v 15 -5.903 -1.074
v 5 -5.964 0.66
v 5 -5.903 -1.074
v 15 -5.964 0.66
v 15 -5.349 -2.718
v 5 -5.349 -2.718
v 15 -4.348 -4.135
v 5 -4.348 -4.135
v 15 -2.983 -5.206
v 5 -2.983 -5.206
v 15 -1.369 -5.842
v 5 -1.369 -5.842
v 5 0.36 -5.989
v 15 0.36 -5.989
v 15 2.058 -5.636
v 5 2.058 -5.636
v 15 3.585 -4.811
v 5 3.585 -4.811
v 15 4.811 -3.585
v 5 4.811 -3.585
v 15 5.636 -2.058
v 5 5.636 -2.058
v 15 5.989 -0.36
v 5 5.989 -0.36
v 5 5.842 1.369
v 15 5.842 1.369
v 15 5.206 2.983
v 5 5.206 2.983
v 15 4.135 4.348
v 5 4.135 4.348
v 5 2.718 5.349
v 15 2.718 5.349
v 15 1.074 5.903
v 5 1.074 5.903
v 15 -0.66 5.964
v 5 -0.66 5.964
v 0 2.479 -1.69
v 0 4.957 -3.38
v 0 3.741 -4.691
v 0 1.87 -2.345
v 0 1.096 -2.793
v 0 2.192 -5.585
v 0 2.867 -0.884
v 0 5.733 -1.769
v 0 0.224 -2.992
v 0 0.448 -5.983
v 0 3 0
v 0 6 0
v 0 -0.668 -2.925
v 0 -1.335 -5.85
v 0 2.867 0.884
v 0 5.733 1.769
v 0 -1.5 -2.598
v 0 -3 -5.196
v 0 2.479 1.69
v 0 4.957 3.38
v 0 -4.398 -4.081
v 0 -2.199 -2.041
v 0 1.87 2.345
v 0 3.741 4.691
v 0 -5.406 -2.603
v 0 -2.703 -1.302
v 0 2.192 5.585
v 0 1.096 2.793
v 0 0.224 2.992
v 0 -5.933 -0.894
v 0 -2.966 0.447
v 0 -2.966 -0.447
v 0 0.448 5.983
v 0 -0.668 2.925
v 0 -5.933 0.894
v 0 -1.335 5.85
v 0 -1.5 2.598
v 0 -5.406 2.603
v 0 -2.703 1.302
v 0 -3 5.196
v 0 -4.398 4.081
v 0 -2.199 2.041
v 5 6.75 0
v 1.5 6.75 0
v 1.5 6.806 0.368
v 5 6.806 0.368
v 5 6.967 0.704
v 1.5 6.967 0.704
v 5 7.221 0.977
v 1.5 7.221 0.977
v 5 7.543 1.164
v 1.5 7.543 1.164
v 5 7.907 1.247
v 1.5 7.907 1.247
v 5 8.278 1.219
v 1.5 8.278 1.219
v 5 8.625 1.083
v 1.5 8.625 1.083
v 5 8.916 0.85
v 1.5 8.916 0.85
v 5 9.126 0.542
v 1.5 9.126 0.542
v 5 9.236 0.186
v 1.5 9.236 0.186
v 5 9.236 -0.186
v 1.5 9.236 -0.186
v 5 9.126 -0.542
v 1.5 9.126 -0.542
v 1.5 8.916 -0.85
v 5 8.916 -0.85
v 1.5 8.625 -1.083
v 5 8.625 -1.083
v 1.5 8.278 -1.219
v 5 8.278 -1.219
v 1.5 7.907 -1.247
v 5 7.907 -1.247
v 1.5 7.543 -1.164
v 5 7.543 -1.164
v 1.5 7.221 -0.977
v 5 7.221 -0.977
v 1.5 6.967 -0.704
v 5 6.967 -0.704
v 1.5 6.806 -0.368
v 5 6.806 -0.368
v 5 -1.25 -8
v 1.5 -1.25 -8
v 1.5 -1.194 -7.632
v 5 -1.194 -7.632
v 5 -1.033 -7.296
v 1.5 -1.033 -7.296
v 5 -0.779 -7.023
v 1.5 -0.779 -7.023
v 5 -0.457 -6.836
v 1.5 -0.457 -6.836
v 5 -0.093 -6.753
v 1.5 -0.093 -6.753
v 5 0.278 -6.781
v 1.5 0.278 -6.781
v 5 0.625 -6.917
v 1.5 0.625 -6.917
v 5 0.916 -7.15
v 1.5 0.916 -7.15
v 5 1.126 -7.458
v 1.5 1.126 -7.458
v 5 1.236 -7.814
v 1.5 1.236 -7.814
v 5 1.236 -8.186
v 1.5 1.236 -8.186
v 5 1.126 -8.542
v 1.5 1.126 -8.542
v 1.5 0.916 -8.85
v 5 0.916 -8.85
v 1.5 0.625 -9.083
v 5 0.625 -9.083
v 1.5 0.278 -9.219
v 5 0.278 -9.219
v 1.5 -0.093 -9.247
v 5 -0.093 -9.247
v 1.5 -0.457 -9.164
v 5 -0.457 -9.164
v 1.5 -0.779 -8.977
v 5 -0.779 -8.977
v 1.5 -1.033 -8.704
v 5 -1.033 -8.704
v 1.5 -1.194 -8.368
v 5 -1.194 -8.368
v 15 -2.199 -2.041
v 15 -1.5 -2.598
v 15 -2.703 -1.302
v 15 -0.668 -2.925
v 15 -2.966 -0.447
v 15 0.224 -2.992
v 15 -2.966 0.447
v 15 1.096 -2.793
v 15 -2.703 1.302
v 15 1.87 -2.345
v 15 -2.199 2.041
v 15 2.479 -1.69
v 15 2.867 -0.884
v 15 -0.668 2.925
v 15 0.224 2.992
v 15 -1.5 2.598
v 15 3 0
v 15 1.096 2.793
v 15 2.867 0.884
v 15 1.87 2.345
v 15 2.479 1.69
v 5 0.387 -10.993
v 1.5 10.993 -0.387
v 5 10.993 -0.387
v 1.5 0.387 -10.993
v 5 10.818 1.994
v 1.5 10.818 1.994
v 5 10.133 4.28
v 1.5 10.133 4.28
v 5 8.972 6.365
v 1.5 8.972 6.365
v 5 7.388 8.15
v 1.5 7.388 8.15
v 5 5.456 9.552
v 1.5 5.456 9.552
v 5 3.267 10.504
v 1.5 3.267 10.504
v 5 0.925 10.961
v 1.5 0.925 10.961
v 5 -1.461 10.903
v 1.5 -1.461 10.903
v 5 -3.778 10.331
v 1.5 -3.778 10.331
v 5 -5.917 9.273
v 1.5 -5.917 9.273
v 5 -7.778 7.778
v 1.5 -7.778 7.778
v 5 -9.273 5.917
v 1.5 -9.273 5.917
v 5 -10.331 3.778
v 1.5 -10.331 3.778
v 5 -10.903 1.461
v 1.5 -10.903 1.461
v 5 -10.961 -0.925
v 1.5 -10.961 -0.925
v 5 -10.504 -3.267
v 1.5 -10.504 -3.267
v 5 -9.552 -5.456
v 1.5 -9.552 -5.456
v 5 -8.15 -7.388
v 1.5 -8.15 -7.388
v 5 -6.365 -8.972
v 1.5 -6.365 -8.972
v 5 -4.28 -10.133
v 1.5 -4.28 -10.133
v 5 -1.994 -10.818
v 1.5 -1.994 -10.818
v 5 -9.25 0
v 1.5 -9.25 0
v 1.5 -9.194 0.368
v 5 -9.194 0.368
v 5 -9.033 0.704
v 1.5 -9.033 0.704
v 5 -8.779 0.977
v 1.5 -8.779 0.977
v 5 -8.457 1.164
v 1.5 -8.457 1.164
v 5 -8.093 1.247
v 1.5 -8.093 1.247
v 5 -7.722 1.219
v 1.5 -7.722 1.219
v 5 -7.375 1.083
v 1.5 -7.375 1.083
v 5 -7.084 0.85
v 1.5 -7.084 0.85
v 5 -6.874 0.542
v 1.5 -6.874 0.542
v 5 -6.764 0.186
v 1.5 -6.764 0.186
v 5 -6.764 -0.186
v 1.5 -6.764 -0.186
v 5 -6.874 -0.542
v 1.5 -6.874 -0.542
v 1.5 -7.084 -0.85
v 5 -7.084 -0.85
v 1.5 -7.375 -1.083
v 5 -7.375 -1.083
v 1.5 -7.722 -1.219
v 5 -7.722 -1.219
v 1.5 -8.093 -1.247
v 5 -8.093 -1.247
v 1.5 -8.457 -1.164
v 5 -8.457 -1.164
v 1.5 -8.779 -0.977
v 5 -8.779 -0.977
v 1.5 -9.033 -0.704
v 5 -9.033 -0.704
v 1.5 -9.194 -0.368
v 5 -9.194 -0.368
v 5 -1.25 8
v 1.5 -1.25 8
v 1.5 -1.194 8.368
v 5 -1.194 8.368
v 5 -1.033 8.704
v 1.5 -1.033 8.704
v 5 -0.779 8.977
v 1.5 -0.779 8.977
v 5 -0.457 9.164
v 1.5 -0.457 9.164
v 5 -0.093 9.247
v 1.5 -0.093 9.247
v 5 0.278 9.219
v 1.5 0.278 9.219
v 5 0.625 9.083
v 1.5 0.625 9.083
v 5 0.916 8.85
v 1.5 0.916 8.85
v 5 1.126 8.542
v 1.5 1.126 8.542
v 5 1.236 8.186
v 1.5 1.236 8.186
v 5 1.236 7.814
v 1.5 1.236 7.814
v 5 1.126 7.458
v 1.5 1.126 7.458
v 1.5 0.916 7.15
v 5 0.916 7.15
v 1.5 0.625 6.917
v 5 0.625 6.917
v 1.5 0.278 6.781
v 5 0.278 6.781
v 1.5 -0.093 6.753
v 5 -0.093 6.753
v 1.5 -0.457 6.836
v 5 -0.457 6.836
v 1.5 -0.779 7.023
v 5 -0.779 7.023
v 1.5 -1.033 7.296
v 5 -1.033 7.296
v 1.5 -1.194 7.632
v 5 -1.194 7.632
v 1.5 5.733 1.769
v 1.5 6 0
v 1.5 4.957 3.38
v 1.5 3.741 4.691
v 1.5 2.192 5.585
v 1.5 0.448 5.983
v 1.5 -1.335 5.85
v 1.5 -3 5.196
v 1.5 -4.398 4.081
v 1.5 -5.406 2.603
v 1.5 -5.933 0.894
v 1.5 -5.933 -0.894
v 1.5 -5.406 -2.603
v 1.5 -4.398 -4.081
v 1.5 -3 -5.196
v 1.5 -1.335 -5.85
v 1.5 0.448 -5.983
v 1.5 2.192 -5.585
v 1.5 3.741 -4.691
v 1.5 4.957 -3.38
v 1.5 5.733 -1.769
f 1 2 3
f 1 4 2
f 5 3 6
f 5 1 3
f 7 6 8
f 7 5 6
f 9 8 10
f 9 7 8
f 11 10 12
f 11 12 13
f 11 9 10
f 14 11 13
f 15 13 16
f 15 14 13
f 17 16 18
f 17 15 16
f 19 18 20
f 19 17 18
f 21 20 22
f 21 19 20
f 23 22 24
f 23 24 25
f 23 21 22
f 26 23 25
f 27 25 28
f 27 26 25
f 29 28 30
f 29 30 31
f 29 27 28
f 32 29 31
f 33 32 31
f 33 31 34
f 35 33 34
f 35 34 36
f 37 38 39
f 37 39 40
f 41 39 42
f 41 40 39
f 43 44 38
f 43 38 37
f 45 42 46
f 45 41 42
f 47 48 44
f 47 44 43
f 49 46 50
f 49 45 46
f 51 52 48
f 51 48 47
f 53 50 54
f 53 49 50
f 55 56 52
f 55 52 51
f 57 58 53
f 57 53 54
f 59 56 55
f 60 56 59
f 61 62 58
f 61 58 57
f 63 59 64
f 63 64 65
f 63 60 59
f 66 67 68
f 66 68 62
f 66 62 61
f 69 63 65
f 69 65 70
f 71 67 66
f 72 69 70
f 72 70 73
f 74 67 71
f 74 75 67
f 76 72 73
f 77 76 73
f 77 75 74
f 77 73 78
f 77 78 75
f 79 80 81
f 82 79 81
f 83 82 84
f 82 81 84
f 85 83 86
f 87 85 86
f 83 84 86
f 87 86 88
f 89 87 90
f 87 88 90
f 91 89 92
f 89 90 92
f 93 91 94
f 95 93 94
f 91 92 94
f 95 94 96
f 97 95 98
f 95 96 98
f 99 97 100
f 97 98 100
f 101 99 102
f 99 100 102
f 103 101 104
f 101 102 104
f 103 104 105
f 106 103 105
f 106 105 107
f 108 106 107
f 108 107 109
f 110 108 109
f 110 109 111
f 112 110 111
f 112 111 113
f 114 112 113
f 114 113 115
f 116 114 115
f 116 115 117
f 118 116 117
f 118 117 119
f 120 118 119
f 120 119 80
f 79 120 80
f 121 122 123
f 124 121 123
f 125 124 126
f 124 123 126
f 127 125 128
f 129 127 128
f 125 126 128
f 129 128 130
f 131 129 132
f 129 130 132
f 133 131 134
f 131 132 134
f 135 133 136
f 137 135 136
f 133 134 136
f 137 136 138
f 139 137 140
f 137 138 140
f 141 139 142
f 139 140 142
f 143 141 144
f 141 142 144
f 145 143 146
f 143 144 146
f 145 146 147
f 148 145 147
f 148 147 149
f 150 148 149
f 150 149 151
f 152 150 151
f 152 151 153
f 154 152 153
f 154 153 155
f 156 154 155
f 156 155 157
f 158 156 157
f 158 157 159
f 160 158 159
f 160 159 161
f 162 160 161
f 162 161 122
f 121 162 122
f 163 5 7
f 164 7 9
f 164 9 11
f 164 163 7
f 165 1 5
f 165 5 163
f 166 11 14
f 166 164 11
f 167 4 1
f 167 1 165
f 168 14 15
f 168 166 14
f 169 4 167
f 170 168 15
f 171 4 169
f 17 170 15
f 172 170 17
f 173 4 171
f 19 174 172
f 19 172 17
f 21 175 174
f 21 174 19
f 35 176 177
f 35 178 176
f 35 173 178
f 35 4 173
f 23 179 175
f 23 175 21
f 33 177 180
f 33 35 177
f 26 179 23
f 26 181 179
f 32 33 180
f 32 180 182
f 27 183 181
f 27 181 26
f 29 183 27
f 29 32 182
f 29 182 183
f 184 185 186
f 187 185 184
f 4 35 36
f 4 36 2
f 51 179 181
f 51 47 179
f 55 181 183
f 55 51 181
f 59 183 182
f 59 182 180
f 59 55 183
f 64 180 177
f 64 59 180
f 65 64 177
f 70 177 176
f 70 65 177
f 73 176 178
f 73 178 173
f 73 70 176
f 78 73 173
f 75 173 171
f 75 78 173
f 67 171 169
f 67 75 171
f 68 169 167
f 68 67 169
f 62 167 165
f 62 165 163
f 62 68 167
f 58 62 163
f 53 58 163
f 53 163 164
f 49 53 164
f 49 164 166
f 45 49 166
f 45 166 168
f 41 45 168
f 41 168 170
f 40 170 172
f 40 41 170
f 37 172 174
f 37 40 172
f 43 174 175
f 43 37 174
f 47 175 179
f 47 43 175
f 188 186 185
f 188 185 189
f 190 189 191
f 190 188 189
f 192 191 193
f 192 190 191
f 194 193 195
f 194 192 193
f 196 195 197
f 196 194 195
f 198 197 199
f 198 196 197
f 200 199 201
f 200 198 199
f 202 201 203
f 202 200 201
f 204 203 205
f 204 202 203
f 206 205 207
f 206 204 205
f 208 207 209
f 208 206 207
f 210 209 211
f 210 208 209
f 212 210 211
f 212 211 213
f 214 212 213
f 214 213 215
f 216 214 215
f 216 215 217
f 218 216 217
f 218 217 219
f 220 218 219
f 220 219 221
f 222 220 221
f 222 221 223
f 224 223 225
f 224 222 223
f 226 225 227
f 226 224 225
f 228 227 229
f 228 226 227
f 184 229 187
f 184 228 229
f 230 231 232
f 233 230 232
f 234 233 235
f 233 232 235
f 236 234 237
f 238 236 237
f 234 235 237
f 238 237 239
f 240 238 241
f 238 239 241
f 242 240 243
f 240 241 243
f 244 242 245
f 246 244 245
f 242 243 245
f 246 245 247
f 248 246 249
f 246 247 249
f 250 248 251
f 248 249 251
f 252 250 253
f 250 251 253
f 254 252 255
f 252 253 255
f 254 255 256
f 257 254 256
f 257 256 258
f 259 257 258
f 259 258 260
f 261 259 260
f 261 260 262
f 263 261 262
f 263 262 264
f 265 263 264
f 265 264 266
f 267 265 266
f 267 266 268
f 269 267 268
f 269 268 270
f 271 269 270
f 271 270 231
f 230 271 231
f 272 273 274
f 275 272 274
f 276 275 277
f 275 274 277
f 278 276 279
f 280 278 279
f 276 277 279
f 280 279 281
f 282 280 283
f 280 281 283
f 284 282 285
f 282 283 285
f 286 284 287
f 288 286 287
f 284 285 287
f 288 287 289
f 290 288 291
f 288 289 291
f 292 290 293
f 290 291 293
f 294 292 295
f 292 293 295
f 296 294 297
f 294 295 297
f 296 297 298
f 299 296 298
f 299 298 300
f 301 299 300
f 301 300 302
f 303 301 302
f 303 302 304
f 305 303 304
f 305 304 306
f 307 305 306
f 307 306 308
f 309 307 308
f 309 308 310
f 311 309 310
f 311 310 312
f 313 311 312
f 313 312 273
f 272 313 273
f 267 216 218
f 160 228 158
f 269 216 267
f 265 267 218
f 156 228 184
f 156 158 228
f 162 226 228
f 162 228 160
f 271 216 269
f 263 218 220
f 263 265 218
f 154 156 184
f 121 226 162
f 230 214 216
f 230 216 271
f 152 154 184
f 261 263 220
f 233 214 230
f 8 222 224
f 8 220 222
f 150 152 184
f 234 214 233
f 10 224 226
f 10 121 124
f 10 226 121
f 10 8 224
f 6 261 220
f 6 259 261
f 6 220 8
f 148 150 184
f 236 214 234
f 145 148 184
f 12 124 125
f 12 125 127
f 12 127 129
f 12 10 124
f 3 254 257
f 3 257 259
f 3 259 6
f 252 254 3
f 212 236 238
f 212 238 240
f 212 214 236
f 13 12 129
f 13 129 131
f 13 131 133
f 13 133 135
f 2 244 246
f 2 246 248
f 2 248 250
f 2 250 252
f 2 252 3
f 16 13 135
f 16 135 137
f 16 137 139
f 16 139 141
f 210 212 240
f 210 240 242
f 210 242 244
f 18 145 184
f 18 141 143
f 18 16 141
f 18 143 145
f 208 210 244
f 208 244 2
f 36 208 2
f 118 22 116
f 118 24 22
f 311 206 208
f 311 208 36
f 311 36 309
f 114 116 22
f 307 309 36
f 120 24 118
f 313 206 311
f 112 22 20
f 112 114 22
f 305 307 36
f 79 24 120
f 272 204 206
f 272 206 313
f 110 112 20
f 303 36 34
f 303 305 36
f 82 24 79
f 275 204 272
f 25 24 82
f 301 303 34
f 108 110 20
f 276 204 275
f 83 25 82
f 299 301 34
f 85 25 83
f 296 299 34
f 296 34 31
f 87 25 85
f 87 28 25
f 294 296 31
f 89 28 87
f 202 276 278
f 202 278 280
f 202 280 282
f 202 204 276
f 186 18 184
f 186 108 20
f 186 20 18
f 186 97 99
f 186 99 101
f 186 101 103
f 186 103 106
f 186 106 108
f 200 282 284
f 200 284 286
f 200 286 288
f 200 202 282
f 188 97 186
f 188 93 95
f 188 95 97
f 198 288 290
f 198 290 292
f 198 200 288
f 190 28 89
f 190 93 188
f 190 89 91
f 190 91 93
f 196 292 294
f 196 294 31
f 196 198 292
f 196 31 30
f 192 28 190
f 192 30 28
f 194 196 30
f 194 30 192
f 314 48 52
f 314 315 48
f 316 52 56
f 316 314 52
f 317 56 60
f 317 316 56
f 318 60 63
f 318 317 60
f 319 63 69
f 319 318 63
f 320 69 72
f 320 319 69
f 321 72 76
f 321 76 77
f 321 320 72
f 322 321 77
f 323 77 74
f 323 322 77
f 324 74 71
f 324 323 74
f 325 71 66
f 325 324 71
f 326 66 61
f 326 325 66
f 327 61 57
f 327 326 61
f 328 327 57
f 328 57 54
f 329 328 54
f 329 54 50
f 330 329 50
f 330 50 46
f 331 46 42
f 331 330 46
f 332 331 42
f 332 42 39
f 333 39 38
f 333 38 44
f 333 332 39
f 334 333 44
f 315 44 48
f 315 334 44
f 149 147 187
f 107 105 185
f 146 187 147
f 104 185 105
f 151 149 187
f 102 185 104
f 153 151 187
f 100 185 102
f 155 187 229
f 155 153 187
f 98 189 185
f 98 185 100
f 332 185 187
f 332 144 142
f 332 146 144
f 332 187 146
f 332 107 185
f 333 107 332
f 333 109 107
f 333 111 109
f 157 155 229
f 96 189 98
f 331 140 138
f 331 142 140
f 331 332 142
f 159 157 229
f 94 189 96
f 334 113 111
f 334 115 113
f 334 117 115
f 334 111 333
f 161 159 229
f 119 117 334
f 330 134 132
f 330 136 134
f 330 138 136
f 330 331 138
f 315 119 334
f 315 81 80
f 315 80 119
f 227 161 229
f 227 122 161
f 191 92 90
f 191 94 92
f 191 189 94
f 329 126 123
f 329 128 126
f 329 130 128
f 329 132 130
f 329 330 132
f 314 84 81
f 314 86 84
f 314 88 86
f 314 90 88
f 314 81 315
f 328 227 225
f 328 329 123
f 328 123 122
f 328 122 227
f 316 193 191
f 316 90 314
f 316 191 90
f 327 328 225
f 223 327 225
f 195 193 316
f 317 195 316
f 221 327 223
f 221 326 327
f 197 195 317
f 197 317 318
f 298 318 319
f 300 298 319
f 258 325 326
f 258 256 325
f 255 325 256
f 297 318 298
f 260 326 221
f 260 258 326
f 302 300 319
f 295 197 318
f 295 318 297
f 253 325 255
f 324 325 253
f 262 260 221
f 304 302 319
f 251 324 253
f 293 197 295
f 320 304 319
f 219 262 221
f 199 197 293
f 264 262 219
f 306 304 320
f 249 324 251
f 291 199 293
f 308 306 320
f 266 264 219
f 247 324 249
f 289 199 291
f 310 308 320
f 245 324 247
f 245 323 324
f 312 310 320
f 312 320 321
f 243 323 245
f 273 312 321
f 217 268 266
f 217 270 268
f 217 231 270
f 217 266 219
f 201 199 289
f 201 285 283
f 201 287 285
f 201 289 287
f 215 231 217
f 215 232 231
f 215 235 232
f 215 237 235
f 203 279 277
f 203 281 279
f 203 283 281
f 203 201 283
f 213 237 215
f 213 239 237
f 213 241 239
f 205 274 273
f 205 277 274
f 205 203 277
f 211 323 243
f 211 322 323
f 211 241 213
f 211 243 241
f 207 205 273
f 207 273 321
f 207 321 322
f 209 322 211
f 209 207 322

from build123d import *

# Parameters (mm, degrees)
SKETCH001_R     = 1.25
POCKET_DEPTH    = 5
POCKET001_DEPTH = 5
POCKET002_DEPTH = 10


with BuildPart() as part:
    # Sketch → Revolution (revolve)
    with BuildSketch(Plane.XY):
        Polygon((0, 3), (0, 6), (1.5, 6), (1.5, 11), (5, 11), (5, 6), (15, 6), (15, 3), align=None)
    revolve(axis=Axis((0, 0, 0), (1, 0, 0)))

    # Sketch001 (on Face3 of Revolution) → Pocket (cut)
    with BuildSketch(Plane(origin=(1.5, 0, 0), x_dir=(0, -1, 0), z_dir=(-1, 0, 0))):
        with Locations((0, 8)):
            Circle(SKETCH001_R)
        with Locations((-8, 0)):
            Circle(SKETCH001_R)
        with Locations((8, 0)):
            Circle(SKETCH001_R)
        with Locations((0, -8)):
            Circle(SKETCH001_R)
    extrude(amount=-POCKET_DEPTH, mode=Mode.SUBTRACT)

    # Sketch004 (on Face5 of Pocket) → Pocket001 (cut)
    with BuildSketch(Plane(origin=(1.5, 0, 0), x_dir=(0, -1, 0), z_dir=(-1, 0, 0))):
        with BuildLine():
            Line((-10.993204, -0.386602), (-0.386602, -10.993204))
            ThreePointArc((-10.993204, -0.386602), (-7.778175, -7.778175), (-0.386602, -10.993204))
        make_face()
    extrude(amount=-POCKET001_DEPTH, mode=Mode.SUBTRACT)

    # Sketch005 (on Face4 of Pocket001) → Pocket002 (cut)
    with BuildSketch(Plane.YZ.offset(15)):
        with BuildLine():
            Line((-0.66026, 5.963561), (-5.963561, 0.66026))
            ThreePointArc((-0.66026, 5.963561), (-4.242641, 4.242641), (-5.963561, 0.66026))
        make_face()
    extrude(amount=-POCKET002_DEPTH, mode=Mode.SUBTRACT)


solid = part.part
